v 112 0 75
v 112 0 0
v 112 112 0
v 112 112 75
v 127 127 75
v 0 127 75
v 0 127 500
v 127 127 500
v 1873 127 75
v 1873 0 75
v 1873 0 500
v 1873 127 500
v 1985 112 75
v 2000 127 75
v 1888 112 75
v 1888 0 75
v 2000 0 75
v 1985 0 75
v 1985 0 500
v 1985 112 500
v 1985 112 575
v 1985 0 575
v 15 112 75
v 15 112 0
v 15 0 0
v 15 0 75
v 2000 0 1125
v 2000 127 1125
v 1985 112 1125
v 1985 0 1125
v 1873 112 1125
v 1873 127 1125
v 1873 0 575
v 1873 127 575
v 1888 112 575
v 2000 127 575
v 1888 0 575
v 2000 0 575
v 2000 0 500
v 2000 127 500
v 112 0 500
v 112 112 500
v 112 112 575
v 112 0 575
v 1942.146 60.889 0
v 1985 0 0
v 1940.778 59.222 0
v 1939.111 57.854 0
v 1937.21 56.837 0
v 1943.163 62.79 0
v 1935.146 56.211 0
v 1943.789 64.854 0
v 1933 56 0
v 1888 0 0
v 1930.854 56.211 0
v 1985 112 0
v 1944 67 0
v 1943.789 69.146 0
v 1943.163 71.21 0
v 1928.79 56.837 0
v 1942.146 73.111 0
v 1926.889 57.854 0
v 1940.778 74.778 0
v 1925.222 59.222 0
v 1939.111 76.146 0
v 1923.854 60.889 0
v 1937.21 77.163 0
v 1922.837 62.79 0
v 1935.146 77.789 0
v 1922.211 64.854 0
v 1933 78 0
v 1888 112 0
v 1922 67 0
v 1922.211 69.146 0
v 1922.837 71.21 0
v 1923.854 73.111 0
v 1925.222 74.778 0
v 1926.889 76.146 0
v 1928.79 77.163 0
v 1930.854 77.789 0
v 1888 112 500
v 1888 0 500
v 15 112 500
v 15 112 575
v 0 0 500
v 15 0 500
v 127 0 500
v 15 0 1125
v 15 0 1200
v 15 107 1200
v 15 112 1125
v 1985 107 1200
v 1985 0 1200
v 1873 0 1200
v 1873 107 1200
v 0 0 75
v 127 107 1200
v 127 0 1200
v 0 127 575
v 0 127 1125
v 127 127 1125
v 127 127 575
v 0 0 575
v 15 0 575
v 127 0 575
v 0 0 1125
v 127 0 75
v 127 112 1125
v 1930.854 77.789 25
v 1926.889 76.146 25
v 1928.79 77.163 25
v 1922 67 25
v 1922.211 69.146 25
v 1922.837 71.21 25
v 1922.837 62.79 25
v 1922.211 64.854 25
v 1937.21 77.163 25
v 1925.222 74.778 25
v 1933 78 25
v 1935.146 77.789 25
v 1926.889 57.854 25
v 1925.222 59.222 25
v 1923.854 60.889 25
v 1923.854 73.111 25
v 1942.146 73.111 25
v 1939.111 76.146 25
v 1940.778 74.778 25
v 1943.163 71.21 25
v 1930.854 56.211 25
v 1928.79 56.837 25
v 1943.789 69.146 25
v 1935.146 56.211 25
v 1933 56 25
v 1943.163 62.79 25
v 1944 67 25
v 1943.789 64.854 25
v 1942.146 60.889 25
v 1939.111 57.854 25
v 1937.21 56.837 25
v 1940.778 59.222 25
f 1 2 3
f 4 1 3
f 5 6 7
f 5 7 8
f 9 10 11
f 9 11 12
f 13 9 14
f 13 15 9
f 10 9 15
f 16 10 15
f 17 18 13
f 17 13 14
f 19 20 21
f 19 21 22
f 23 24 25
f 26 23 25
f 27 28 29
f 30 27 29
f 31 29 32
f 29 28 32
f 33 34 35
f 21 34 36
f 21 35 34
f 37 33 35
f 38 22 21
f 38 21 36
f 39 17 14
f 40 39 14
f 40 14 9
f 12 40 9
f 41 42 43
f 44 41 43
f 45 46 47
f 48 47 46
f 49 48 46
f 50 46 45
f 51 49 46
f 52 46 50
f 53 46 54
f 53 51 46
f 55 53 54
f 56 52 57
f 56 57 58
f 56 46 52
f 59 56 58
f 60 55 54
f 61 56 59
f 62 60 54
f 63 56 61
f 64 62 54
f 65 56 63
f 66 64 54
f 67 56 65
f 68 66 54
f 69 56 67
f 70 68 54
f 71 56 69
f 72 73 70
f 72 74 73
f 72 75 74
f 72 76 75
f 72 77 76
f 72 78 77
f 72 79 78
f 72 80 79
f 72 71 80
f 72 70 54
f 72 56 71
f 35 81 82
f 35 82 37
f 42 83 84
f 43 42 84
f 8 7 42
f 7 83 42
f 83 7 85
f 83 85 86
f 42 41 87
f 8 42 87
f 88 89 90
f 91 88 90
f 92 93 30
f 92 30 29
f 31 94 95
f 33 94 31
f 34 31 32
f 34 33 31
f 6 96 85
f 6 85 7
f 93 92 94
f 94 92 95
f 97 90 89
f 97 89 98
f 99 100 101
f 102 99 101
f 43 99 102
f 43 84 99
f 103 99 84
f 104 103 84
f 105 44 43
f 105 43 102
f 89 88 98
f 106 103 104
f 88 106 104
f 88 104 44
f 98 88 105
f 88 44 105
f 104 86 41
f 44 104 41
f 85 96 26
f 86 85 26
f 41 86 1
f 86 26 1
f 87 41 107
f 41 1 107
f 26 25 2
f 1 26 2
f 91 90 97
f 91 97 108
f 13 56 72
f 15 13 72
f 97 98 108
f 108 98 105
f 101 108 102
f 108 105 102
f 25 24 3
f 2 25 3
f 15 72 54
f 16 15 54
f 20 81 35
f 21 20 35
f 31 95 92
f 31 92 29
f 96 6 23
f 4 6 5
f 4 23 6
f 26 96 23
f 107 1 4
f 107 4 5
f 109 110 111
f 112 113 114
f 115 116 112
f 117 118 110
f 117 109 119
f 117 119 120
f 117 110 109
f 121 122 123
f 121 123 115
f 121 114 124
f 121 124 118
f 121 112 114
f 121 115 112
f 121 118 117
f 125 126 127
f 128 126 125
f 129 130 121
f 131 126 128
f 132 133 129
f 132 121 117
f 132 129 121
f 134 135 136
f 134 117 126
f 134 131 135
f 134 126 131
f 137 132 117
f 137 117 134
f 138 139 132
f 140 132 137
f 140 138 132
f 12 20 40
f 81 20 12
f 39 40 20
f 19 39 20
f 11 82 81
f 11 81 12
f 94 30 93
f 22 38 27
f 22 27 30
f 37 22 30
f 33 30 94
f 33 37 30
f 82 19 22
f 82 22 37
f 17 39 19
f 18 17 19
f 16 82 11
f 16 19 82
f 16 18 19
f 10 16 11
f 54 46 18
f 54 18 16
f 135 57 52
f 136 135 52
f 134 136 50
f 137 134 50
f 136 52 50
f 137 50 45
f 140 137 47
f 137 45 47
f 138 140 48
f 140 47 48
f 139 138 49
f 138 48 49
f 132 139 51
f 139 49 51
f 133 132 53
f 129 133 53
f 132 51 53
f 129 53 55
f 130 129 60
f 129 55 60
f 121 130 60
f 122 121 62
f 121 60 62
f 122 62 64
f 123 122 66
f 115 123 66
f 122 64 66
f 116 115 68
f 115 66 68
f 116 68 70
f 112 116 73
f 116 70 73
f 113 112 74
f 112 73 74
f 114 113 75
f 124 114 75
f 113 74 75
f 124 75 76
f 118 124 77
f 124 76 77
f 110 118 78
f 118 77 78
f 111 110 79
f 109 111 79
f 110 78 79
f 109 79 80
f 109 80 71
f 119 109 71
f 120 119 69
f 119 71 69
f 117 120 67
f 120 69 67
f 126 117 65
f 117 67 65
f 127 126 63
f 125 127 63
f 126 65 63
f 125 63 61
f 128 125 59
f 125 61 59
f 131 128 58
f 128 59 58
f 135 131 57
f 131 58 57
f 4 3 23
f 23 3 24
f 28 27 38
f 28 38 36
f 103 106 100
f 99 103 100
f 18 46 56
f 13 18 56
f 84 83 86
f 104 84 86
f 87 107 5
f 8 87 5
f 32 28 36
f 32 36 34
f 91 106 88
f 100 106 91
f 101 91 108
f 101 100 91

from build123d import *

# Parameters (mm, degrees)
F0_W      = 127
F0_H      = 127
F1_DEPTH  = 1200
F3_DEPTH  = 75
F5_START  = -500
F4_W      = 15
F4_H      = 127
F5_DEPTH  = 75
F7_DEPTH  = 127.001
F11_DEPTH = 75
F13_DEPTH = 75
F14_W     = 15
F14_H     = 75
F15_DEPTH = 127.001
F16_W     = 15
F16_H     = 75
F17_DEPTH = 127.001
F18_W     = 15
F18_H     = 75
F19_DEPTH = 1985.001
F20_W     = 15
F20_H     = 75
F21_DEPTH = 112.001
F22_R     = 11
F23_DEPTH = 25


# Not quite as in the source:
# - a feature names something its author has since deleted; it is built from what else it names


with BuildPart() as f1:
    # F0 (on Top) → F1 (new body)
    with BuildSketch(Plane.XY):
        with Locations((63.5, 63.5)):
            Rectangle(F0_W, F0_H)
    extrude(amount=F1_DEPTH)

    # F2 (on face) → F3 (cut)
    with BuildSketch(Plane.XY.offset(1200)):
        Polygon((0, 127), (0, 0), (15, 0), (15, 112), (127, 112), (127, 127), align=None)
    extrude(amount=-F3_DEPTH, mode=Mode.SUBTRACT)

    # F4 (on face) → F5 (cut)
    with BuildSketch(Plane(origin=(0, 0, 0), x_dir=(1, 0, 0), z_dir=(0, 0, -1)).offset(F5_START)):
        with Locations((7.5, -63.5)):
            Rectangle(F4_W, F4_H)
    extrude(amount=-F5_DEPTH, mode=Mode.SUBTRACT)

    # F6 (on face) → F7 (cut, through all)
    with BuildSketch(Plane.YZ.offset(127)):
        Polygon((112, 1125), (112, 1200), (107, 1200), align=None)
    extrude(amount=-F7_DEPTH, mode=Mode.SUBTRACT)


with BuildPart() as f9_1:
    # F9: instance of F1
    add(f1.part.mirror(Plane.YZ.offset(1000)))

    # F10 (on face) → F11 (cut)
    with BuildSketch(Plane(origin=(0, 0, 0), x_dir=(1, 0, 0), z_dir=(0, 0, -1))):
        Polygon((1873, -127), (2000, -127), (2000, 0), (1985, 0), (1985, -112), (1888, -112), (1888, 0), (1873, 0), align=None)
    extrude(amount=-F11_DEPTH, mode=Mode.SUBTRACT)

    # F16 (on face) → F17 (cut, through all)
    with BuildSketch(Plane.XZ):
        with Locations((1880.5, 537.5)):
            Rectangle(F16_W, F16_H)
    extrude(amount=-F17_DEPTH, mode=Mode.SUBTRACT)


with BuildPart() as f1_1:
    add(f1.part)

    # F12 (on face) → F13 (cut)
    with BuildSketch(Plane(origin=(0, 0, 0), x_dir=(1, 0, 0), z_dir=(0, 0, -1))):
        Polygon((0, -127), (127, -127), (127, 0), (112, 0), (112, -112), (15, -112), (15, 0), (0, 0), align=None)
    extrude(amount=-F13_DEPTH, mode=Mode.SUBTRACT)

    # F14 (on face) → F15 (cut, through all)
    with BuildSketch(Plane.XZ):
        with Locations((119.5, 537.5)):
            Rectangle(F14_W, F14_H)
    extrude(amount=-F15_DEPTH, mode=Mode.SUBTRACT)


with BuildPart() as f19_tool:
    # F18 (on face) → F19 (new body, through all)
    with BuildSketch(Plane(origin=(15, 0, 0), x_dir=(0, -1, 0), z_dir=(-1, 0, 0))):
        with Locations((-119.5, 537.5)):
            Rectangle(F18_W, F18_H)
    extrude(amount=-F19_DEPTH)


with BuildPart() as f1_2:
    add(f1_1.part)

    # F19: cut by f19_tool
    add(f19_tool.part, mode=Mode.SUBTRACT)

    # F20 (on face) → F21 (cut, through all)
    with BuildSketch(Plane(origin=(1888, 0, 0), x_dir=(0, -1, 0), z_dir=(-1, 0, 0))):
        with Locations((-119.5, 537.5)):
            Rectangle(F20_W, F20_H)
    extrude(amount=-F21_DEPTH, mode=Mode.SUBTRACT)


with BuildPart() as f9_1_1:
    add(f9_1.part)

    # F19: cut by f19_tool
    add(f19_tool.part, mode=Mode.SUBTRACT)

    # F22 (on face) → F23 (cut)
    with BuildSketch(Plane(origin=(0, 0, 0), x_dir=(1, 0, 0), z_dir=(0, 0, -1))):
        with Locations((1933, -67)):
            Circle(F22_R)
    extrude(amount=-F23_DEPTH, mode=Mode.SUBTRACT)


solid = Compound([f1_2.part, f9_1_1.part])
